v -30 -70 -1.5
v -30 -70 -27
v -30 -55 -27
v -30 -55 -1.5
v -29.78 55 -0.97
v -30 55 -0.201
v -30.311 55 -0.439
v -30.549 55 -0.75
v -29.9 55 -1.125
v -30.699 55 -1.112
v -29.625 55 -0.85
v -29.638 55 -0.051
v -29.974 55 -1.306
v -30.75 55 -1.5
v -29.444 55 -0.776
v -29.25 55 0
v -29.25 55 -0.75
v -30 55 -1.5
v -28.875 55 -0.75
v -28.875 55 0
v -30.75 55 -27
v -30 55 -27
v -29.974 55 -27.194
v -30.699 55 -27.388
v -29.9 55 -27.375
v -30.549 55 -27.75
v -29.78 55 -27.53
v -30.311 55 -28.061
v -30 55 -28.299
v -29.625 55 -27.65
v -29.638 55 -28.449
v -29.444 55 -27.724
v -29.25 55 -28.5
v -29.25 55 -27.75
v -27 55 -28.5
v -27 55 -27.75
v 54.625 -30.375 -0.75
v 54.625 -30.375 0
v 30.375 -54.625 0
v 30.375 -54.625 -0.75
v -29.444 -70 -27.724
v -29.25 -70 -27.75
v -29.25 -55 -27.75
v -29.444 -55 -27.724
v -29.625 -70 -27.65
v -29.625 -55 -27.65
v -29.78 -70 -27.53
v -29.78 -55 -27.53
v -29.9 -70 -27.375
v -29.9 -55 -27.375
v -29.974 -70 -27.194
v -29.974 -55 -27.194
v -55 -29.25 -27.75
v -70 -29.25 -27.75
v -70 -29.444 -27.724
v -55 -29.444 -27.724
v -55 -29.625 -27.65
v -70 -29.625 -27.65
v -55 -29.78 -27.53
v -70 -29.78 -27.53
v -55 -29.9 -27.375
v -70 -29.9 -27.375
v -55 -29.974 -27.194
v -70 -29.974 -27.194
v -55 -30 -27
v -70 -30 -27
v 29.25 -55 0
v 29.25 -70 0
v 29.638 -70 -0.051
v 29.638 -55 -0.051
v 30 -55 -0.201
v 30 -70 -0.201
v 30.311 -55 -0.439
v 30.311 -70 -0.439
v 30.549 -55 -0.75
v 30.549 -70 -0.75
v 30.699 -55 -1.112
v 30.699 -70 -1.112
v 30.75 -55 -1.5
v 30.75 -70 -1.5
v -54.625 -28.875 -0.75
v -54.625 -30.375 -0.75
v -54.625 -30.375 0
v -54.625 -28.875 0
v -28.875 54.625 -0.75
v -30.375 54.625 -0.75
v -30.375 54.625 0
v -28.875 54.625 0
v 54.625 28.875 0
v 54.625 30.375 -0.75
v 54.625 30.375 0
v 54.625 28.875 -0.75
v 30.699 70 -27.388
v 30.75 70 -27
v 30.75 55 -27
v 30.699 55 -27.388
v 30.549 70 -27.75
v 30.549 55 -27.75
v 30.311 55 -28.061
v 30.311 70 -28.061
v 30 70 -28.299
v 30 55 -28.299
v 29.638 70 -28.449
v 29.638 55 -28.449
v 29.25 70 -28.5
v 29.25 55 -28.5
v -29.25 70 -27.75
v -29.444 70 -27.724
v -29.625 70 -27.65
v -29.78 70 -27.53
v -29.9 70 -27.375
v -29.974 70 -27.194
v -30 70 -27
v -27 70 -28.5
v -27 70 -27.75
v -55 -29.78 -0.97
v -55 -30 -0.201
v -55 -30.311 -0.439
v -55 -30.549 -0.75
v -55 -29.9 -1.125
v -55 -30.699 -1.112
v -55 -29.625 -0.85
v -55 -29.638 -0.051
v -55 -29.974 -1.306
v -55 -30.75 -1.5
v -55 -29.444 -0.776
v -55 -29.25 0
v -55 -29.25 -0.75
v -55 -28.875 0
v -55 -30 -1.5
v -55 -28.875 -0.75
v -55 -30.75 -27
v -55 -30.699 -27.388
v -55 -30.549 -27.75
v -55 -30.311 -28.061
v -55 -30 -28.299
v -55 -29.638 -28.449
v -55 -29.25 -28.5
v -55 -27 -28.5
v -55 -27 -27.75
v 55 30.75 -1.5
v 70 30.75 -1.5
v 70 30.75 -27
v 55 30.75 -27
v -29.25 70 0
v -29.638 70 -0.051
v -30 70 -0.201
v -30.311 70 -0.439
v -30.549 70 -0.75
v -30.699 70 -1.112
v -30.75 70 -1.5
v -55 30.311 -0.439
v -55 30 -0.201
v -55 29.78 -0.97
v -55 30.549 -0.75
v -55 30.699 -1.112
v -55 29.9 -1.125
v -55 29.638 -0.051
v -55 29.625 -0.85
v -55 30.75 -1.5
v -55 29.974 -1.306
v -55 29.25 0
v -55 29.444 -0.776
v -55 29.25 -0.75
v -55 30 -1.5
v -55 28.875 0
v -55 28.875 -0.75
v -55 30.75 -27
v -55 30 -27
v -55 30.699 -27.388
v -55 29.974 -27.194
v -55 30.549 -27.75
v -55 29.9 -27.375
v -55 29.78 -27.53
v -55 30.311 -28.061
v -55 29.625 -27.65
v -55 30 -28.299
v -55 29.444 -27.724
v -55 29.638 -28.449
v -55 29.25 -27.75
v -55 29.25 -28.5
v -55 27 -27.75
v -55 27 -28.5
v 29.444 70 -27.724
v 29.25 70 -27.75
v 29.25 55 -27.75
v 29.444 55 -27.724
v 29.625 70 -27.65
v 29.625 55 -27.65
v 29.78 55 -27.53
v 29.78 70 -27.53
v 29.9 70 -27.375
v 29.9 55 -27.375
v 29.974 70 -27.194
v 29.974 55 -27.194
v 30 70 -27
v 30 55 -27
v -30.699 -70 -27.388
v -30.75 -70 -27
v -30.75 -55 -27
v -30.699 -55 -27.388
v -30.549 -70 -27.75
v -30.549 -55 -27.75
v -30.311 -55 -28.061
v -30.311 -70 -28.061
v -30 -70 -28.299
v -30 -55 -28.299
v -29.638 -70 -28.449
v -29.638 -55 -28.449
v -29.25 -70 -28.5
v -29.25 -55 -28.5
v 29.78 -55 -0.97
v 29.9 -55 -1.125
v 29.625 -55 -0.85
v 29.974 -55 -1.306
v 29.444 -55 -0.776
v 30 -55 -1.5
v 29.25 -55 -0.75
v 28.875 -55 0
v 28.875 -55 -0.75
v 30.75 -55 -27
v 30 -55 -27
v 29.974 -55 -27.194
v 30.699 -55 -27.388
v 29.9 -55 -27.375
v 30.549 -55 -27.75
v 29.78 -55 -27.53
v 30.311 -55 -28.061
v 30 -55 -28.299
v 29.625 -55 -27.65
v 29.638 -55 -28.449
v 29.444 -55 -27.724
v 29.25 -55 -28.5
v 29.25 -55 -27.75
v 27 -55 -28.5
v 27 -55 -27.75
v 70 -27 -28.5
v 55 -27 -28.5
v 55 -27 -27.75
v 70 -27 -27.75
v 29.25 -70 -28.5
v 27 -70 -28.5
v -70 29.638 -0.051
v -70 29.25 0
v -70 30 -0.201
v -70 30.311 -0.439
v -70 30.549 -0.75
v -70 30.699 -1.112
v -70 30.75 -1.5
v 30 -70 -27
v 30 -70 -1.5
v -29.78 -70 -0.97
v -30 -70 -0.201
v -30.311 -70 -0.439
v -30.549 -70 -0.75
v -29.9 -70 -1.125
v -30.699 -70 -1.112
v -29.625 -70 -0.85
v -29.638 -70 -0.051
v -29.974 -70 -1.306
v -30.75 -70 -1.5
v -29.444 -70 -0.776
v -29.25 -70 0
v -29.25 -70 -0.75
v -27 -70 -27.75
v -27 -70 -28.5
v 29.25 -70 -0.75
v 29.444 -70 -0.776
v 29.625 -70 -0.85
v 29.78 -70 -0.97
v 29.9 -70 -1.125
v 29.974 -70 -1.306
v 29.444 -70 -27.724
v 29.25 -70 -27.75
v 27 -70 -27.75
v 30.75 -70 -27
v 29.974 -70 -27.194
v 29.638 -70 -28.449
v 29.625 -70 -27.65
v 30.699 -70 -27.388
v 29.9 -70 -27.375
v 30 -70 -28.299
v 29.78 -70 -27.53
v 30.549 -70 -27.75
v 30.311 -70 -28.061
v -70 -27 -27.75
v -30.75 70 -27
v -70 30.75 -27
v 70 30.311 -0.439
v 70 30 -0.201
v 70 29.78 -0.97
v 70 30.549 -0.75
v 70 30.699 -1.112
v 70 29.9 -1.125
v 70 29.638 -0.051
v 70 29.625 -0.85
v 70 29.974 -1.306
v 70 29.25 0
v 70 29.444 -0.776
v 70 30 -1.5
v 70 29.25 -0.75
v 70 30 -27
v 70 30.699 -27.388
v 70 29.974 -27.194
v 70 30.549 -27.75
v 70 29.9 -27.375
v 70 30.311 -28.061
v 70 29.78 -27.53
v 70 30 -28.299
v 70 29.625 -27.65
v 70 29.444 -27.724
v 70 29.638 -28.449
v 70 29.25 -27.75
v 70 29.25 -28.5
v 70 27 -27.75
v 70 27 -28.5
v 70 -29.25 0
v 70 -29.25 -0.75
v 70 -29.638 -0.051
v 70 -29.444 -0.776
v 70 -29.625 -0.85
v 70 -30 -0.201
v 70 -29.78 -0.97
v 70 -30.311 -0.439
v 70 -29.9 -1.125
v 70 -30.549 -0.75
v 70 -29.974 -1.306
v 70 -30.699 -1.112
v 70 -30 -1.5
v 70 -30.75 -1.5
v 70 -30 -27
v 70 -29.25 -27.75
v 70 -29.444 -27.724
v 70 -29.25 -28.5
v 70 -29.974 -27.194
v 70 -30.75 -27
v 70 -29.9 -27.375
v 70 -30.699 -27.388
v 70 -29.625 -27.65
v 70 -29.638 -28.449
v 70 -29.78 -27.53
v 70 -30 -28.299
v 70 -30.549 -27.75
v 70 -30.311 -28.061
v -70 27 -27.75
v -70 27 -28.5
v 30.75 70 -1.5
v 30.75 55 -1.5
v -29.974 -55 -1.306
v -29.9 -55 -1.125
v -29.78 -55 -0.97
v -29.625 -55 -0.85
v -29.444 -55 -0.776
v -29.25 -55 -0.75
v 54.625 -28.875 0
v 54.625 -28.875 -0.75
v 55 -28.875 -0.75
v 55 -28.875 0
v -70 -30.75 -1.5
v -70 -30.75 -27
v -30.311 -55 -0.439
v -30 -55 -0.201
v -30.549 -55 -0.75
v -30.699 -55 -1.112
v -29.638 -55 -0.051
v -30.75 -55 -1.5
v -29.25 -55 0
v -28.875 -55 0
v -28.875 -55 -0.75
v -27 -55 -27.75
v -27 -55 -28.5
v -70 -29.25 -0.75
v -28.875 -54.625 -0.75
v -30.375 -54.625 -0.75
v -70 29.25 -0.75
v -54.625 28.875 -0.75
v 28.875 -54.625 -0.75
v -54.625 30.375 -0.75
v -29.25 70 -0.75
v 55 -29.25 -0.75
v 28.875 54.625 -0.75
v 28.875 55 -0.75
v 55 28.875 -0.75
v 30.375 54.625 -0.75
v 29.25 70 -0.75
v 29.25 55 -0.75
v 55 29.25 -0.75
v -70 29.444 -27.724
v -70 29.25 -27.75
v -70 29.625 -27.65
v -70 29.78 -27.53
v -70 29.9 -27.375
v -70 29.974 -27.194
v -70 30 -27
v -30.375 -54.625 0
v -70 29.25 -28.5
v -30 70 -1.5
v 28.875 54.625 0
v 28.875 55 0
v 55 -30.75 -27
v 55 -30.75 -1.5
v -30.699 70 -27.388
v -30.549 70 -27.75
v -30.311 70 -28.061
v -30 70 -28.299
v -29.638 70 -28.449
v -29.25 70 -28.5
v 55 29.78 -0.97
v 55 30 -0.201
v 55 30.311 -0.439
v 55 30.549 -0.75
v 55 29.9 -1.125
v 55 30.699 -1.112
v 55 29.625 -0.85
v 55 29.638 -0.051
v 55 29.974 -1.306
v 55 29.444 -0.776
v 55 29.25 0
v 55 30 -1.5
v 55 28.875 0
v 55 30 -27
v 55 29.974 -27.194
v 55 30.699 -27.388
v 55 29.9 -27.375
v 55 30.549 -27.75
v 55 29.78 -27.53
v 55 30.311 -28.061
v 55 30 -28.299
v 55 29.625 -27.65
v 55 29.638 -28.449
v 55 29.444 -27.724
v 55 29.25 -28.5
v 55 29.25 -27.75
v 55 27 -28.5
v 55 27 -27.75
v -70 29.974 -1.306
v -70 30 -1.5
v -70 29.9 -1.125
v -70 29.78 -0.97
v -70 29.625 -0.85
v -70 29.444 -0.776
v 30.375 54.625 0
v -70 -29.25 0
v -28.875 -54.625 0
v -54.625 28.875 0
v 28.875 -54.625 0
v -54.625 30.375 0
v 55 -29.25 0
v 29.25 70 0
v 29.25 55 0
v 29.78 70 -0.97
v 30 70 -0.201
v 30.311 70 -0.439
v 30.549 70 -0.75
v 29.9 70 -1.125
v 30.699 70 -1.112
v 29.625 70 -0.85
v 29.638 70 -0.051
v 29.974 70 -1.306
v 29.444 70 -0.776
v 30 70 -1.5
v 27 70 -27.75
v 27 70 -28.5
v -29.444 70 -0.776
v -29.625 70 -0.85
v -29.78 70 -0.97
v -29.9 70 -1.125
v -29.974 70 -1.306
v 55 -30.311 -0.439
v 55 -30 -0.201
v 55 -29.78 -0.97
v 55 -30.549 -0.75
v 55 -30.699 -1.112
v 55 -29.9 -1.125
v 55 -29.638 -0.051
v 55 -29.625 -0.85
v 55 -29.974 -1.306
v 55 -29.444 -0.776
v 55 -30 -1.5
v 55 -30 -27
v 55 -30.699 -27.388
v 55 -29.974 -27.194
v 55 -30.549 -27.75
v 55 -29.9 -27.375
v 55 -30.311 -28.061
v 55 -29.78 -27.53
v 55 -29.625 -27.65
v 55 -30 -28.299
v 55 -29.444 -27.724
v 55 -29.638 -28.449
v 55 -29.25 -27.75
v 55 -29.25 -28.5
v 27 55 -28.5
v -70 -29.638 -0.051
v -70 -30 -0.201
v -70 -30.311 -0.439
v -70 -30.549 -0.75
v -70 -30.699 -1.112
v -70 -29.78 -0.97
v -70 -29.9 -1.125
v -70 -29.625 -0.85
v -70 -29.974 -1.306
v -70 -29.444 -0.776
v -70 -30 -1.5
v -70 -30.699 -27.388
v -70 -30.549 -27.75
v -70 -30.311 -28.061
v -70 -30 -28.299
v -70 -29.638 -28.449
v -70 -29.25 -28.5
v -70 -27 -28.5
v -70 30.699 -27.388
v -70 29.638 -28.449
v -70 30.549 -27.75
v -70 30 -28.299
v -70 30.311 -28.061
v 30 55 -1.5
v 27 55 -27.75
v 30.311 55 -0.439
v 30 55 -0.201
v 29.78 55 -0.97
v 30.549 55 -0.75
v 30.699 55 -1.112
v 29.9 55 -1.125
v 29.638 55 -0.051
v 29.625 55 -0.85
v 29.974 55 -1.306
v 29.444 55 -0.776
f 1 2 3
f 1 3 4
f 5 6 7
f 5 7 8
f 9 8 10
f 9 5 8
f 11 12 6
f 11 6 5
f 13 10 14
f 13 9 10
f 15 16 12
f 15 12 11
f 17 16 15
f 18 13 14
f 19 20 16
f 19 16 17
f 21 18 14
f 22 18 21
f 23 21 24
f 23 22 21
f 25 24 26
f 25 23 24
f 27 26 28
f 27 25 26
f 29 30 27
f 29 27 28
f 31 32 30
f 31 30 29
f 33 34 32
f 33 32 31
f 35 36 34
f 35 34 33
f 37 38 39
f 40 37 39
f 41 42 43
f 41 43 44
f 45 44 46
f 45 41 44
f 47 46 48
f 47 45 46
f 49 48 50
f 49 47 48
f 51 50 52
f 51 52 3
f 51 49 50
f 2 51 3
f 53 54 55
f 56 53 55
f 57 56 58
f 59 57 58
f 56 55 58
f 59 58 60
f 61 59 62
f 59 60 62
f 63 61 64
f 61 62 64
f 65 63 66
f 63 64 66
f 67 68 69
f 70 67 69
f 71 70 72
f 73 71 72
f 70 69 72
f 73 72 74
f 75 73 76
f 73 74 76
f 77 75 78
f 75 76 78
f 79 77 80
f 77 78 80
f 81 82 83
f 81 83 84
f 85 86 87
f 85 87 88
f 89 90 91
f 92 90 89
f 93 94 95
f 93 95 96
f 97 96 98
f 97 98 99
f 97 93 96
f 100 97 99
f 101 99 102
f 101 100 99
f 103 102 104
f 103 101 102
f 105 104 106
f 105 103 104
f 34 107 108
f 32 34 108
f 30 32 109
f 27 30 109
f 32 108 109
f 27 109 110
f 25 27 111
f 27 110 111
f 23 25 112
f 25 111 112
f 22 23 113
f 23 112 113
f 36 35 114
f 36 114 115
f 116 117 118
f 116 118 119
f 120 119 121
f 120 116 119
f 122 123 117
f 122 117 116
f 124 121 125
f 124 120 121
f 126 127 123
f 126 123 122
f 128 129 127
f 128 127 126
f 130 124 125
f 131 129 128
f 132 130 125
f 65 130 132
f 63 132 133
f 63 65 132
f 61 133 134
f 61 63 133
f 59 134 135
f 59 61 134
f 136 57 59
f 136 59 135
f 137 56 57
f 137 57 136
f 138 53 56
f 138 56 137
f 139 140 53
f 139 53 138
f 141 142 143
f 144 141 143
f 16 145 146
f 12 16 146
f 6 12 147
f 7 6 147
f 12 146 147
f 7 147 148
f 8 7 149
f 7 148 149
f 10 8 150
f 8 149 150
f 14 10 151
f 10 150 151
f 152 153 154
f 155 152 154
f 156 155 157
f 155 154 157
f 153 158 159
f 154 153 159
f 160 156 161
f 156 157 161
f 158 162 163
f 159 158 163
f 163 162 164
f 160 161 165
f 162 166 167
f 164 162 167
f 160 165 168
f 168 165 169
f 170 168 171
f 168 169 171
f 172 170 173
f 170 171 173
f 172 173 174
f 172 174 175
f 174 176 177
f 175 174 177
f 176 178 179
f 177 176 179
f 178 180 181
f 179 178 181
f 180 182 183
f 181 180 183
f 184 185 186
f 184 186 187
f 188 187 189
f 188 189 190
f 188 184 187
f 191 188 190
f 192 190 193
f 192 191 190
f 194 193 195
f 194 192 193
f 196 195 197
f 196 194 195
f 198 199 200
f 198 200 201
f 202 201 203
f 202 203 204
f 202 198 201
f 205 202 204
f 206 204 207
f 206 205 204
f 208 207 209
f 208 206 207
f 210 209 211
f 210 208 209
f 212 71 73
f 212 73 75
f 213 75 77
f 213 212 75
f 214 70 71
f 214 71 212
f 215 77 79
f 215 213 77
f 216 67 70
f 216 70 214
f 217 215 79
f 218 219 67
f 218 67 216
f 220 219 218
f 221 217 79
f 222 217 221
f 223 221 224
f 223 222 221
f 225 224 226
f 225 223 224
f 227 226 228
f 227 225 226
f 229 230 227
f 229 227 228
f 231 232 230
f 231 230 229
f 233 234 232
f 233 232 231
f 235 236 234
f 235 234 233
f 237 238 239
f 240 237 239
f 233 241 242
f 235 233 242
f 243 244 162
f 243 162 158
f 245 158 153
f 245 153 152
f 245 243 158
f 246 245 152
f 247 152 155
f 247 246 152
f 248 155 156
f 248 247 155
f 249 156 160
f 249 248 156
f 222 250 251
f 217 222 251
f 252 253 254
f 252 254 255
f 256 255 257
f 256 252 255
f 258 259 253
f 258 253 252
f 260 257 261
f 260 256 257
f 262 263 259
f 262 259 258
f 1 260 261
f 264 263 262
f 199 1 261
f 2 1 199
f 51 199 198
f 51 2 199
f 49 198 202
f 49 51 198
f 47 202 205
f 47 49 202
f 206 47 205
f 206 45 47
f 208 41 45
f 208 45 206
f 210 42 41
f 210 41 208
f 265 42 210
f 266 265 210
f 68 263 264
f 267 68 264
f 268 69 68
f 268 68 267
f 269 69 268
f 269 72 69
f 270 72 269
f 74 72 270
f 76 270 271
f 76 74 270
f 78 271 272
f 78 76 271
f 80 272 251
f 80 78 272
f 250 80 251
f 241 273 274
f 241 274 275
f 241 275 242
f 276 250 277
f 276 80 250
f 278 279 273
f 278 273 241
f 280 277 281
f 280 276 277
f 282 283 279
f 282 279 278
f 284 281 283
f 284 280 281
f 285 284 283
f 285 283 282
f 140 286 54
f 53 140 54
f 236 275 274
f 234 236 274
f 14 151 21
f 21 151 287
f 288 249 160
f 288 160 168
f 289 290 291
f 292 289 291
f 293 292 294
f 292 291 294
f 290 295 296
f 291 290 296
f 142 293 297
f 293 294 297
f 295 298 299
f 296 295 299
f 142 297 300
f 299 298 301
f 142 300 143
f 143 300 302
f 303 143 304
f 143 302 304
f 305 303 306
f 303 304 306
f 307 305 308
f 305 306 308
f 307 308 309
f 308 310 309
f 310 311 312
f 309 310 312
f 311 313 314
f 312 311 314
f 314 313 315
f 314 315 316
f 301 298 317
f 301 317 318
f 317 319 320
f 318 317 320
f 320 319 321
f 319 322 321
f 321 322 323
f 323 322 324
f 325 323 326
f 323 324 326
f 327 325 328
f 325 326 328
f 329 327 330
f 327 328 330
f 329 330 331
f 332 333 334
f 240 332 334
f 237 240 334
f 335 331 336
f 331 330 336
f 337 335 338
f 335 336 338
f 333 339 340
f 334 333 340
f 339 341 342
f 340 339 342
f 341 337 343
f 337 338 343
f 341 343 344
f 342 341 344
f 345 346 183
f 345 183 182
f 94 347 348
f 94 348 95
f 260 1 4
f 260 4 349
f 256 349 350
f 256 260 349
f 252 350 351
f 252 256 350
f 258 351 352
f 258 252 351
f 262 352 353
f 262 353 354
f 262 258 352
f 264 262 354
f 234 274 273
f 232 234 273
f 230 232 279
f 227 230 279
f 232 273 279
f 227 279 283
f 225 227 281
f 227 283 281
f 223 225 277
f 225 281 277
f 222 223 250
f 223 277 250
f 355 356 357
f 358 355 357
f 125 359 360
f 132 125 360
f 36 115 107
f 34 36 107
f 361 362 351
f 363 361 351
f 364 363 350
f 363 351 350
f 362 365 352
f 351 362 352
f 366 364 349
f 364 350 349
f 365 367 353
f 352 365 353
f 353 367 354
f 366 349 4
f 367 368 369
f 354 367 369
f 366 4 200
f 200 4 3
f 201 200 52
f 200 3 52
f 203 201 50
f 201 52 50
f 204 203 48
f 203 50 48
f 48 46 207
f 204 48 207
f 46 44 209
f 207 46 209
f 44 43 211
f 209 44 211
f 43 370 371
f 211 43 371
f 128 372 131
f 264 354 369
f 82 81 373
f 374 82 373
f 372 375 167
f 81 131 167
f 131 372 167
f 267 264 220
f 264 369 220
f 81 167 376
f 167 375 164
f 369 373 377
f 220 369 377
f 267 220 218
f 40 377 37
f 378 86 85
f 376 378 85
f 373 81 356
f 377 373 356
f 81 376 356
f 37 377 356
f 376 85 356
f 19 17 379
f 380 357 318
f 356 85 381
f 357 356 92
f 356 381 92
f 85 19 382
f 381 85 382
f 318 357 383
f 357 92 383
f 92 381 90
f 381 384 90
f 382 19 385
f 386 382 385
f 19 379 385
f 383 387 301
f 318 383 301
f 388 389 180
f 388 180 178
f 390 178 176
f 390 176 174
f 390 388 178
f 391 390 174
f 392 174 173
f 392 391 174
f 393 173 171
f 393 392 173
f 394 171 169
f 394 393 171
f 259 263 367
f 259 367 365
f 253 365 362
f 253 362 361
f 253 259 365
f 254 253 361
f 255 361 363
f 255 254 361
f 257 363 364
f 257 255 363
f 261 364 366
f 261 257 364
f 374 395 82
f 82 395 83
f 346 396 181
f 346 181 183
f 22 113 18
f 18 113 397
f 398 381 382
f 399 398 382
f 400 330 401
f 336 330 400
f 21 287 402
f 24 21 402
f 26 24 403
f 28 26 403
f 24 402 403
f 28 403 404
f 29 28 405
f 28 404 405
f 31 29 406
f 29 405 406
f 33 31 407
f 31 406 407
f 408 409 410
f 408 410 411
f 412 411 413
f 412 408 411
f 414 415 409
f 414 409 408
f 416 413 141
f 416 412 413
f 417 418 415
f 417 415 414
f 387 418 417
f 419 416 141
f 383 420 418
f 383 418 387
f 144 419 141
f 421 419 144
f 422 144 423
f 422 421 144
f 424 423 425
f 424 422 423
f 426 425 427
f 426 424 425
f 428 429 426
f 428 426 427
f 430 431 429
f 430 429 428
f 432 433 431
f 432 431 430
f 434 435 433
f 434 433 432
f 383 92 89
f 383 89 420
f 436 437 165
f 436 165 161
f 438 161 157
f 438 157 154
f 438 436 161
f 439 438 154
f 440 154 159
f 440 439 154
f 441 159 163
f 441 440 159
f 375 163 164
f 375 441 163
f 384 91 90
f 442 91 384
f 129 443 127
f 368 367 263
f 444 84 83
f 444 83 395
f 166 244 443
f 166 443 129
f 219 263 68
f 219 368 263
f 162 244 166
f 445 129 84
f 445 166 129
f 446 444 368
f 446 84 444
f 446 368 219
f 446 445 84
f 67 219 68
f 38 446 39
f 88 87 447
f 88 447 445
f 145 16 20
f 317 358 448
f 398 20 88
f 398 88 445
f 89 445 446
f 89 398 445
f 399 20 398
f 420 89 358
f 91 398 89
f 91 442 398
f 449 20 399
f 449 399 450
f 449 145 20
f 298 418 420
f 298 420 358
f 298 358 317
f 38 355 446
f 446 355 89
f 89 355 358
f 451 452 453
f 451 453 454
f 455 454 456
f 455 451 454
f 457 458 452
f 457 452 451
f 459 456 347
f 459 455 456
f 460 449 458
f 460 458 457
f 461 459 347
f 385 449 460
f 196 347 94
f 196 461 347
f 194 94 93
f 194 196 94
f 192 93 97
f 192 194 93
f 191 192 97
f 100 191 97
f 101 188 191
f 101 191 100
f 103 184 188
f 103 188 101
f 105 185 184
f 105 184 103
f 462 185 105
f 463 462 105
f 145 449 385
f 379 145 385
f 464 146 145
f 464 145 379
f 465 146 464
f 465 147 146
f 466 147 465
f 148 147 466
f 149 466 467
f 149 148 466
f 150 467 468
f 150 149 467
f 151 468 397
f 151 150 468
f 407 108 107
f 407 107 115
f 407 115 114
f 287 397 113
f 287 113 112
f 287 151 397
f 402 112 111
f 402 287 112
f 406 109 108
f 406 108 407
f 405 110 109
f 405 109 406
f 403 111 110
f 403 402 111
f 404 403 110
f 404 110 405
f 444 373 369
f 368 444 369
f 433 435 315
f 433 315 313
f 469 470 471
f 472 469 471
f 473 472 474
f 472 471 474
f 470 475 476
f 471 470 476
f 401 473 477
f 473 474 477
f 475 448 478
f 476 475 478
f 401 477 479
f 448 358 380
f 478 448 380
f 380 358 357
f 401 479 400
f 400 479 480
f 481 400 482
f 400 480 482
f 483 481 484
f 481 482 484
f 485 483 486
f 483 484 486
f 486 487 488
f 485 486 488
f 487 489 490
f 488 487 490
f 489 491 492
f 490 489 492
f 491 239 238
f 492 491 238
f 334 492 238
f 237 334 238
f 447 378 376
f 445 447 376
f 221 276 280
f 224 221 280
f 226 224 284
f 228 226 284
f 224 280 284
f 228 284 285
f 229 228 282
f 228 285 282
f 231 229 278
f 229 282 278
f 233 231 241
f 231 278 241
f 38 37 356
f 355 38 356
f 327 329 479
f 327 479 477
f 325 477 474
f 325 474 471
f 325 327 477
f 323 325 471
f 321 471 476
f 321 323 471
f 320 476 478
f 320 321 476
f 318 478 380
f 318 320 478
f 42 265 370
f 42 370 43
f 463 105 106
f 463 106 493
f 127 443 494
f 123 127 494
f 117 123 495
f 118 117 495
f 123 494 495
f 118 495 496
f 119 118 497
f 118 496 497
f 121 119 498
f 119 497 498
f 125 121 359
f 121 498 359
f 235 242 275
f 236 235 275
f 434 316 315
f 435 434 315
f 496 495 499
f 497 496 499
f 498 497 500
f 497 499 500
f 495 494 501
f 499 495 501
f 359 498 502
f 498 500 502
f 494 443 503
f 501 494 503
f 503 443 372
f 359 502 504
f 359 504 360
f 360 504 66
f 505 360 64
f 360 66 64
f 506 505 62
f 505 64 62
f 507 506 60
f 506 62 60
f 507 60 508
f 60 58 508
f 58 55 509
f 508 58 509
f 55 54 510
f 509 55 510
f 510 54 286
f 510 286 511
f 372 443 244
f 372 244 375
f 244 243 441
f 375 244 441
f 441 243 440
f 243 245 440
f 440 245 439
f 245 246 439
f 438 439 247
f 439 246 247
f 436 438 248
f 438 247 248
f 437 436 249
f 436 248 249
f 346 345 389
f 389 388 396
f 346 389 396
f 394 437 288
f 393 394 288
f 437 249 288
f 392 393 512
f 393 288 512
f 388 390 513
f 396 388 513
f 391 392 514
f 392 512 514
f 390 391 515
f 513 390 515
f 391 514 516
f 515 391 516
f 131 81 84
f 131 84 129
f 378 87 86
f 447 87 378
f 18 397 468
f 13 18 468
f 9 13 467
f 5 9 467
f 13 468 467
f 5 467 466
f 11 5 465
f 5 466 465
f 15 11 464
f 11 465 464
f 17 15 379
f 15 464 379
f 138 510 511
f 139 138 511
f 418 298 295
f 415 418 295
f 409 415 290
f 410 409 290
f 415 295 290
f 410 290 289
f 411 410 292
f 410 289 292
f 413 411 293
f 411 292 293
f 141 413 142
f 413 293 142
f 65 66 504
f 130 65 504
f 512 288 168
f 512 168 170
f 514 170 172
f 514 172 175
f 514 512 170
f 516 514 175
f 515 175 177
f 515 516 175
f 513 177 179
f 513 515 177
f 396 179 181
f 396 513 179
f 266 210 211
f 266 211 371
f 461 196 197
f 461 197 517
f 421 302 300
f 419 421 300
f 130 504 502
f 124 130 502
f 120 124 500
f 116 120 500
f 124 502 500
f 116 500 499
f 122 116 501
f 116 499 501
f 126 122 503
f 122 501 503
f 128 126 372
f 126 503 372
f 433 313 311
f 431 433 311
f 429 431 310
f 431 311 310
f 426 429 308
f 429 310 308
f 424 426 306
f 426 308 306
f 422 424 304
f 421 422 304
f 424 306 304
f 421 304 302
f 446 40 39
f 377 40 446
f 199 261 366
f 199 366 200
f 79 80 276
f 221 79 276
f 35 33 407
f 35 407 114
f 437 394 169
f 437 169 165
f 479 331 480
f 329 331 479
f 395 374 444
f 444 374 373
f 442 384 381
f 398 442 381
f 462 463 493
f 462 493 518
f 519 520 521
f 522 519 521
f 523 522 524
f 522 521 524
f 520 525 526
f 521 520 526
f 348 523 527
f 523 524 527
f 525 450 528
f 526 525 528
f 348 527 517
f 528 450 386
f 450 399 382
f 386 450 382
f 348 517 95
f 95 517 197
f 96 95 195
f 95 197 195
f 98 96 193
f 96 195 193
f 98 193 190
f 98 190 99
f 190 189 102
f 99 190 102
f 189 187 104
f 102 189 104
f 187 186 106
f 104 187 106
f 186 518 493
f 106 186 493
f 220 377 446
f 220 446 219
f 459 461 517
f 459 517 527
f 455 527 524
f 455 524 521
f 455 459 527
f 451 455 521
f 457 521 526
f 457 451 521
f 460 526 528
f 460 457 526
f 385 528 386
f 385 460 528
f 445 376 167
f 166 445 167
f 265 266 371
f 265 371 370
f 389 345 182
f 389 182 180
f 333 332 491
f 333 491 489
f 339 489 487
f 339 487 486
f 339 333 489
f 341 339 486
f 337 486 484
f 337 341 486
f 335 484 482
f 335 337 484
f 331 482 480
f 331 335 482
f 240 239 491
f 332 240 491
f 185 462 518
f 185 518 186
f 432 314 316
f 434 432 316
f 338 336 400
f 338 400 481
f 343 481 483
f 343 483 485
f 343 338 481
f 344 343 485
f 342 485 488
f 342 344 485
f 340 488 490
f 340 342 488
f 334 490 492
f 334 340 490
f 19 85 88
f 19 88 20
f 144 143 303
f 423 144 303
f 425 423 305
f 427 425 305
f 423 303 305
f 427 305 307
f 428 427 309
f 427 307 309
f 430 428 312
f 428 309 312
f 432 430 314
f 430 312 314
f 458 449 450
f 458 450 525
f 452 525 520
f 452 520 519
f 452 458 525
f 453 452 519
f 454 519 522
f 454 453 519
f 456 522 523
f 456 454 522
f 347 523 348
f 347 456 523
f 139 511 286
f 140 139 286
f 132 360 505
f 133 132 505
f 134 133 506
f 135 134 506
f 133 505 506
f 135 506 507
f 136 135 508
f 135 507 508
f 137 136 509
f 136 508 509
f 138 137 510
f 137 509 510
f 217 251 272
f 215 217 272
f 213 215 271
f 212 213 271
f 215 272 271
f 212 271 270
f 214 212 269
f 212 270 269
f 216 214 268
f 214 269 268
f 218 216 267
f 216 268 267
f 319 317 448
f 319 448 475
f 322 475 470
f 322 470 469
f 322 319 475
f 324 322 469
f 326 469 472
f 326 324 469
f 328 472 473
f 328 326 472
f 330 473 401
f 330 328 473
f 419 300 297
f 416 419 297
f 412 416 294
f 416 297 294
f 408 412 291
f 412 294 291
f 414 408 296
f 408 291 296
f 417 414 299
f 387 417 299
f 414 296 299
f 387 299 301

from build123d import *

# Parameters (mm, degrees)
SM_BASE_FLANGE_1_DEPTH            = 0.75
SM_EDGE_FLANGE_1_STRIP_W          = 4.5
SM_EDGE_FLANGE_1_STRIP_H          = 0.75
SM_EDGE_FLANGE_1_STRIP_CUT_DEPTH  = 15
SM_EDGE_FLANGE_1_RELIEF_W         = 4.875
SM_EDGE_FLANGE_1_RELIEF_H         = 0.375
SM_EDGE_FLANGE_1_RELIEF_CUT_DEPTH = 0.75
SM_EDGE_FLANGE_1_DEPTH            = 15
SM_EDGE_FLANGE_2_STRIP_W          = 4.5
SM_EDGE_FLANGE_2_STRIP_H          = 0.75
SM_EDGE_FLANGE_2_STRIP_CUT_DEPTH  = 15
SM_EDGE_FLANGE_2_DEPTH            = 15


# Sheet-metal steps are written as plain solids
with BuildPart() as part:
    # Sketch 1 → Базовая кромка1 (new body)
    with BuildSketch(Plane.XY):
        Polygon((-70, 0), (-70, 30), (-55, 30), (-42.5, 42.5), (0, 0), align=None)
    extrude(amount=-SM_BASE_FLANGE_1_DEPTH)

    # Ребро-кромка1 strip (across the edge) → Ребро-кромка1 strip cut (cut)
    with BuildSketch(Plane(origin=(-70, 30, -0.75), x_dir=(0, -1, 0), z_dir=(1, 0, 0))):
        with Locations((-1.5, -0.375)):
            Rectangle(SM_EDGE_FLANGE_1_STRIP_W, SM_EDGE_FLANGE_1_STRIP_H)
    extrude(amount=SM_EDGE_FLANGE_1_STRIP_CUT_DEPTH, mode=Mode.SUBTRACT)

    # Ребро-кромка1 relief (on the sheet) → Ребро-кромка1 relief cut (cut)
    with BuildSketch(Plane(origin=(-70, 29.25, -0.75), x_dir=(0, -1, 0), z_dir=(0, 0, -1))):
        with Locations((-2.0625, -15.1875)):
            Rectangle(SM_EDGE_FLANGE_1_RELIEF_W, SM_EDGE_FLANGE_1_RELIEF_H)
    extrude(amount=-SM_EDGE_FLANGE_1_RELIEF_CUT_DEPTH, mode=Mode.SUBTRACT)

    # Ребро-кромка1 section (across the edge) → Ребро-кромка1 (add)
    with BuildSketch(Plane(origin=(-70, 30, -0.75), x_dir=(0, -1, 0), z_dir=(1, 0, 0))):
        with BuildLine():
            Line((-0.75, 0.75), (-0.75, 27))
            Line((-0.75, 27), (0, 27))
            Line((0, 27), (0, 0.75))
            ThreePointArc((0, 0.75), (0.219669914, 0.219669914), (0.75, 0))
            Line((0.75, 0), (0.75, -0.75))
            ThreePointArc((0.75, -0.75), (-0.310660172, -0.310660172), (-0.75, 0.75))
        make_face()
    extrude(amount=SM_EDGE_FLANGE_1_DEPTH)

    # Ребро-кромка2 strip (across the edge) → Ребро-кромка2 strip cut (cut)
    with BuildSketch(Plane(origin=(-70, 30, -27.75), x_dir=(0, 0, 1), z_dir=(1, 0, 0))):
        with Locations((-1.5, -0.375)):
            Rectangle(SM_EDGE_FLANGE_2_STRIP_W, SM_EDGE_FLANGE_2_STRIP_H)
    extrude(amount=SM_EDGE_FLANGE_2_STRIP_CUT_DEPTH, mode=Mode.SUBTRACT)

    # Ребро-кромка2 section (across the edge) → Ребро-кромка2 (add)
    with BuildSketch(Plane(origin=(-70, 30, -27.75), x_dir=(0, 0, 1), z_dir=(1, 0, 0))):
        with BuildLine():
            Line((-0.75, 0.75), (-0.75, 3))
            Line((-0.75, 3), (0, 3))
            Line((0, 3), (0, 0.75))
            ThreePointArc((0, 0.75), (0.219669914, 0.219669914), (0.75, 0))
            Line((0.75, 0), (0.75, -0.75))
            ThreePointArc((0.75, -0.75), (-0.310660172, -0.310660172), (-0.75, 0.75))
        make_face()
    extrude(amount=SM_EDGE_FLANGE_2_DEPTH)

    # Зеркальное отражение1: part across plane


with BuildPart() as part_1:
    add(part.part)
    add(part.part.mirror(Plane(origin=(-70, 0, -0.75), x_dir=(0, 0, 1), z_dir=(0, -1, 0))))

    # Зеркальное отражение2: part across plane


with BuildPart() as part_2:
    add(part_1.part)
    add(part_1.part.mirror(Plane(origin=(0, 0, -0.75), x_dir=(0, 0, 1), z_dir=(0.707106781186558, -0.7071067811865371, 0))))

    # Зеркальное отражение3: part across face


with BuildPart() as part_3:
    add(part_2.part)
    add(part_2.part.mirror(Plane(origin=(0, 0, -0.375), x_dir=(0, 0, 1), z_dir=(0.7071067811865476, 0.7071067811865476, 0))))


solid = part_3.part
